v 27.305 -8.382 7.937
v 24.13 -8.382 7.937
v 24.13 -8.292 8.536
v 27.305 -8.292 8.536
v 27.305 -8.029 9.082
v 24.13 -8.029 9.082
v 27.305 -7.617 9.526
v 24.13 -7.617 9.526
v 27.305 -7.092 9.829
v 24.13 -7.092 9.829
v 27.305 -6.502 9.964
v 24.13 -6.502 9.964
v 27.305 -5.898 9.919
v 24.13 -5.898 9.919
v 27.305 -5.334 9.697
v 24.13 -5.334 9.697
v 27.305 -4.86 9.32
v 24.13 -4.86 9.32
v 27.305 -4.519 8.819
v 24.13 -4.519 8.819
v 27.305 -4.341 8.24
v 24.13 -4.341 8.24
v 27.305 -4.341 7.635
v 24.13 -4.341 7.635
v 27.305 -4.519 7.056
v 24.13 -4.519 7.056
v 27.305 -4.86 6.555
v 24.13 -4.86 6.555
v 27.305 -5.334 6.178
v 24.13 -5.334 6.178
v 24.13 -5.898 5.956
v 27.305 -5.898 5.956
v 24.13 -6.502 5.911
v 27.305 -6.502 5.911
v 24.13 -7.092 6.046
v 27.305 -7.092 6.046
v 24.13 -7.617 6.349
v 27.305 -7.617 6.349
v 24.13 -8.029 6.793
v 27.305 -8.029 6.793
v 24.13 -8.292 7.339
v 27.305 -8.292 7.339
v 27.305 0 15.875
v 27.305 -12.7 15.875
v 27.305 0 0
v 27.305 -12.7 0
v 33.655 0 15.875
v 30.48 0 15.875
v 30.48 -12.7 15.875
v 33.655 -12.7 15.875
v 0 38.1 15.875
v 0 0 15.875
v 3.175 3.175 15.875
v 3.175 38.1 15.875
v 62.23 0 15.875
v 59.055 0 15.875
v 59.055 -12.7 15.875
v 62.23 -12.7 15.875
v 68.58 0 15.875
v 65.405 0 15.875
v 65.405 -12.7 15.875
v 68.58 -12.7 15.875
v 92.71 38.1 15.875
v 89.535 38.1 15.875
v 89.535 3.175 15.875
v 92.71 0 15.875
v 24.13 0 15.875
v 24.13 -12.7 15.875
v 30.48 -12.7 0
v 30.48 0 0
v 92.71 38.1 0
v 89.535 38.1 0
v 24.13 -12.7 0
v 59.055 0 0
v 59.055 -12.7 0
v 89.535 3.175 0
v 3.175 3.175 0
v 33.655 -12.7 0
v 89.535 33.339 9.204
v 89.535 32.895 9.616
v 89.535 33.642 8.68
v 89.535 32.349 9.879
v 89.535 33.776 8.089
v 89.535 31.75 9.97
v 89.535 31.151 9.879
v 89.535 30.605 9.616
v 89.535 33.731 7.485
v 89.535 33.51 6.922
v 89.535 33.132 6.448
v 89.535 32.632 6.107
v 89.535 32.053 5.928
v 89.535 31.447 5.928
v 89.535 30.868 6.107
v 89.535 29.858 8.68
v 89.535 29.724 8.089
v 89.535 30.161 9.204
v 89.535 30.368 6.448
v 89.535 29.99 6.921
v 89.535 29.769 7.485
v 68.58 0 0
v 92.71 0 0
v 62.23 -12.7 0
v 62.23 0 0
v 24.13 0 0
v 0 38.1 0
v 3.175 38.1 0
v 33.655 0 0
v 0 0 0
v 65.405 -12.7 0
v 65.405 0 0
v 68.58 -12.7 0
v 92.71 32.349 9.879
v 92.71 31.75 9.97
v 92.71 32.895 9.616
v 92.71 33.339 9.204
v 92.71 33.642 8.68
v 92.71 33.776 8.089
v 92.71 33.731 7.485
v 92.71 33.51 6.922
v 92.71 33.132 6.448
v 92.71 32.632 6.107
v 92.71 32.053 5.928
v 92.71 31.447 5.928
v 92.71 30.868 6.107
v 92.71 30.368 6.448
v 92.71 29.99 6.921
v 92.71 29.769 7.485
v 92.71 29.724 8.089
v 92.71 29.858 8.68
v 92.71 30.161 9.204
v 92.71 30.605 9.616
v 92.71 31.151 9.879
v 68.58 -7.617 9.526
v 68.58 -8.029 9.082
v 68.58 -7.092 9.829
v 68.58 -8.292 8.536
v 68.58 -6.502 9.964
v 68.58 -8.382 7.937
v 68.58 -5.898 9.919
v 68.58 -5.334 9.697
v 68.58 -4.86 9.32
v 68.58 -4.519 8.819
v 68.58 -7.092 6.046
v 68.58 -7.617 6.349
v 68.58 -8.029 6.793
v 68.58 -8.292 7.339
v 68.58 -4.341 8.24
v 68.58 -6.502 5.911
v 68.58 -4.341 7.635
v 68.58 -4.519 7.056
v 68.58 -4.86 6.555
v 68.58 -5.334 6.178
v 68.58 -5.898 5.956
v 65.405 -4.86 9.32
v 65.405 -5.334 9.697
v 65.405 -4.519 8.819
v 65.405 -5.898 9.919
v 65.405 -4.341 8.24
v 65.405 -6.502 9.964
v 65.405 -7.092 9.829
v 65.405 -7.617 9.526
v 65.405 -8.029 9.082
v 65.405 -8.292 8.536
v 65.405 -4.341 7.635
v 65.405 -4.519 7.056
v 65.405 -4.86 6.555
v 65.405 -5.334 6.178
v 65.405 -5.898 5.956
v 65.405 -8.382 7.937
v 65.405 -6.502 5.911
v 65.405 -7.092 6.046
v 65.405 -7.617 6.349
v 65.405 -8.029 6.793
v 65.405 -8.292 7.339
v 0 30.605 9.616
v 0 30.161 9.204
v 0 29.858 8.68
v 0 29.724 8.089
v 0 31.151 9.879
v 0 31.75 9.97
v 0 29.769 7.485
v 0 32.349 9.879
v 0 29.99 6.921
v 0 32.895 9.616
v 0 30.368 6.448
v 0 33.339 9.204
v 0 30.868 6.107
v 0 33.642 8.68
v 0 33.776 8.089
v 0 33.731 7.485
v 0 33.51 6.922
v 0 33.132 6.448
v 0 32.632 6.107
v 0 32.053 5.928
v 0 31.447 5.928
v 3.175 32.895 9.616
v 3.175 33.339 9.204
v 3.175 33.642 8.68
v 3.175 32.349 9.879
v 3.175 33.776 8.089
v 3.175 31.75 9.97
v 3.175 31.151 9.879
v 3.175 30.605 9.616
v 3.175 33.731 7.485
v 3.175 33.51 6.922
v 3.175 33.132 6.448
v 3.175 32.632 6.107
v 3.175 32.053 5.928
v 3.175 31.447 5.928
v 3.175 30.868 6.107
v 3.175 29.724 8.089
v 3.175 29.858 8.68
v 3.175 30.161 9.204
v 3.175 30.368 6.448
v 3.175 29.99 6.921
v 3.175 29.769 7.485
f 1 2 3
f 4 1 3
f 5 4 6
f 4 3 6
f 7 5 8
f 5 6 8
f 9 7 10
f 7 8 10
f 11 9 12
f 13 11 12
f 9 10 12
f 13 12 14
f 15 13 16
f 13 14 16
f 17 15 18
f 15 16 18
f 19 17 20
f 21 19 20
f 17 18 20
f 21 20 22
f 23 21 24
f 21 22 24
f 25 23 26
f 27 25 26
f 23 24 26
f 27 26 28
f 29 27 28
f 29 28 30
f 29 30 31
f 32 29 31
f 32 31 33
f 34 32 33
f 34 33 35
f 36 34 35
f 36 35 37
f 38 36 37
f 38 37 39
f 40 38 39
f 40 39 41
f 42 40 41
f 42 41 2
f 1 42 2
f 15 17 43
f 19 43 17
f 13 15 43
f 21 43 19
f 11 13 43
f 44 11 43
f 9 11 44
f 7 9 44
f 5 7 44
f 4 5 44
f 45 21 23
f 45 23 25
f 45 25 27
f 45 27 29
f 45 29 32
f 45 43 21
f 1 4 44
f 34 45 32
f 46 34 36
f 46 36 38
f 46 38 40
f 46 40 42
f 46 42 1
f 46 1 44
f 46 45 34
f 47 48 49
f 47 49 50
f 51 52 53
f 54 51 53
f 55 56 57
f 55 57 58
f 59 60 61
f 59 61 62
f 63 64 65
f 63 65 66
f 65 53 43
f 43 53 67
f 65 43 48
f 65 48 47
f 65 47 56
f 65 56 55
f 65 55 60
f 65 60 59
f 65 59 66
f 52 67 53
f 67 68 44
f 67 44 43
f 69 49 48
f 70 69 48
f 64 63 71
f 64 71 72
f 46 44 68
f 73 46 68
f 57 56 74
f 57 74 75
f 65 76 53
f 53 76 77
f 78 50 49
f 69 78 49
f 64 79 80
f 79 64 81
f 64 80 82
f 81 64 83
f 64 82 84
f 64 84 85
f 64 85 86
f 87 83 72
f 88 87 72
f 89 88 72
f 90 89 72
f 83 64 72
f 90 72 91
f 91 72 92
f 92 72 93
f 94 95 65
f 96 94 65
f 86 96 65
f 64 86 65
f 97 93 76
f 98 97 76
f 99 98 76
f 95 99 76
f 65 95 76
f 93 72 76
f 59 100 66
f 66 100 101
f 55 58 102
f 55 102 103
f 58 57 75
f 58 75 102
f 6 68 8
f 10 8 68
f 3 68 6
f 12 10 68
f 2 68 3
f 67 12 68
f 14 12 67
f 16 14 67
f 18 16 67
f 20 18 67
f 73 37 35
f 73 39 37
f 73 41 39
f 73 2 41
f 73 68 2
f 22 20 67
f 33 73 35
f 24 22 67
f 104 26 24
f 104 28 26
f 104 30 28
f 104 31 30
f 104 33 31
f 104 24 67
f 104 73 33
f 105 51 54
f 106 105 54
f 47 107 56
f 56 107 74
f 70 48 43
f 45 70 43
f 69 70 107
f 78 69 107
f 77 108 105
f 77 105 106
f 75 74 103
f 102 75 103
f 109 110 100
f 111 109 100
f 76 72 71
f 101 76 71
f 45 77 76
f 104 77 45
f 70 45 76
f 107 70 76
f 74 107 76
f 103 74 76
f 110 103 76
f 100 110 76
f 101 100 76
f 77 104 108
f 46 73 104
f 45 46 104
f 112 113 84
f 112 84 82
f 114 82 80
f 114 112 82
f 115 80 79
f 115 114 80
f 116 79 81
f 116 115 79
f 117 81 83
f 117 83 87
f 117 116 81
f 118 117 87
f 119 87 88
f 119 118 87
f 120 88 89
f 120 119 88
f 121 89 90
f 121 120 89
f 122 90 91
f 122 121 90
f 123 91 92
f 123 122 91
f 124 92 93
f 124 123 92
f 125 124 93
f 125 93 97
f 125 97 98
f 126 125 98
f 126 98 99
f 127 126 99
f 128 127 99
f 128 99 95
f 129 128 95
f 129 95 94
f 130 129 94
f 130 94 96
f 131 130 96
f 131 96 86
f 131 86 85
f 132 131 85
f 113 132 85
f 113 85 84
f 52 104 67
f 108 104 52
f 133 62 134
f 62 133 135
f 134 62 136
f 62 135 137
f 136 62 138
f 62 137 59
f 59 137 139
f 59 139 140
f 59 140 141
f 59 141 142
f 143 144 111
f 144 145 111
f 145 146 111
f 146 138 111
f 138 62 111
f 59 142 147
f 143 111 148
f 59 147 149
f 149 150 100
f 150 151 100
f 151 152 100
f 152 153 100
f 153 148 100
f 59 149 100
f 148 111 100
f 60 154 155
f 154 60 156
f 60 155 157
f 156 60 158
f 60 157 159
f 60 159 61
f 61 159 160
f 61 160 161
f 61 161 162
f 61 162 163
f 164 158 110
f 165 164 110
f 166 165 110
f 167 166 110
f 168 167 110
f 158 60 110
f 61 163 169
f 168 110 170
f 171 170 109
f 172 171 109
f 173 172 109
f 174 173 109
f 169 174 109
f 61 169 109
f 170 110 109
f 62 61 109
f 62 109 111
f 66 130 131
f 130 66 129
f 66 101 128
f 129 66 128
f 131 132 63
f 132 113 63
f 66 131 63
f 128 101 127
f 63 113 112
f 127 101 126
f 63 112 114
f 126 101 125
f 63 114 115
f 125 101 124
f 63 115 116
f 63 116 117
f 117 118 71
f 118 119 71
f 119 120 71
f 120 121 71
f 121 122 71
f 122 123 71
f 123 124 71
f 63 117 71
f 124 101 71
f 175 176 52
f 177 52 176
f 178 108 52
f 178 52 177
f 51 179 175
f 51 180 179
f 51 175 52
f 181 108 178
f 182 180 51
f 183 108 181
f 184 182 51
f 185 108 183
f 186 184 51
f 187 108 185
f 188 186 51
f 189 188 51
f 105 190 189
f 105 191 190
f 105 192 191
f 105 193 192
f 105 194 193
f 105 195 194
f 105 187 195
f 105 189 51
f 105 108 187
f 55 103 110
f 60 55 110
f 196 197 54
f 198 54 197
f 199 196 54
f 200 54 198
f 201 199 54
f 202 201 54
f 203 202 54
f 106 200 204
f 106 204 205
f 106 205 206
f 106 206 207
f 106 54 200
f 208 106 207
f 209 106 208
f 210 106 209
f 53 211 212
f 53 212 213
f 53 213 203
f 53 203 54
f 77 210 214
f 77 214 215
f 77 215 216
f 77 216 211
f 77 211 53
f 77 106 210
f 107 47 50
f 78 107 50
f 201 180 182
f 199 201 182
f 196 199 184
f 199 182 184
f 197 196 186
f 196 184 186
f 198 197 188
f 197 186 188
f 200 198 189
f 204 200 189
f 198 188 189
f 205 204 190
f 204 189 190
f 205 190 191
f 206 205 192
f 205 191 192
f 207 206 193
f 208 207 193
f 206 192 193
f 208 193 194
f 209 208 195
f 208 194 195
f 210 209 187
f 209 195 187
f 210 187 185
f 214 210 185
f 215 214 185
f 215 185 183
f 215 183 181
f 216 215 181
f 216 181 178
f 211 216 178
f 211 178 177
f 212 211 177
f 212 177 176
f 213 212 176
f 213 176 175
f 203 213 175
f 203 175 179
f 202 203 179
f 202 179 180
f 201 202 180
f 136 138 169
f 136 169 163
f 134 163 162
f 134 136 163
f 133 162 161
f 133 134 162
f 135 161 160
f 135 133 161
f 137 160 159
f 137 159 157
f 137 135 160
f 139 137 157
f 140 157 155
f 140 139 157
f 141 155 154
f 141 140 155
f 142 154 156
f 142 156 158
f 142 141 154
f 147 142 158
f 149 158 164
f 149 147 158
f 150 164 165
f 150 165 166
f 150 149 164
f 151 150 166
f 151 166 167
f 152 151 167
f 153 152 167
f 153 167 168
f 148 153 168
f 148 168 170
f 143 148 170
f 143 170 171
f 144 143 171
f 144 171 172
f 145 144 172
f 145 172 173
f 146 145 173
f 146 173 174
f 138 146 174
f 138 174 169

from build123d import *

# Parameters (mm, degrees)
BOSS_EXTRUDE1_DEPTH = 15.875
CUT_EXTRUDE2_REACH  = 49.811
SKETCH3_R           = 2.032
CUT_EXTRUDE3_REACH  = 64.068
SKETCH4_R           = 2.032


with BuildPart() as part:
    # Sketch1 → Boss-Extrude1 (new body)
    with BuildSketch(Plane.XY):
        Polygon((3.175, 3.175), (46.355, 3.175), (46.355, 0), (33.655, 0), (33.655, -12.7), (30.48, -12.7), (30.48, 0), (27.305, 0), (27.305, -12.7), (24.13, -12.7), (24.13, 0), (0, 0), (0, 38.1), (3.175, 38.1), align=None)
    boss_extrude1 = extrude(amount=BOSS_EXTRUDE1_DEPTH)

    # Sketch3 → Cut-Extrude2 (cut, up to next)
    with BuildSketch(Plane.ZY.offset(-24.13), mode=Mode.PRIVATE) as cut_extrude2_sk1:
        with Locations(Location((7.9375, -6.35, 0), (0, 0, 270))):
            Circle(SKETCH3_R)
    cut_extrude2_tool1 = extrude(cut_extrude2_sk1.sketch, amount=-CUT_EXTRUDE2_REACH, mode=Mode.PRIVATE) & part.part
    cut_extrude2 = cut_extrude2_tool1.solids().sort_by_distance((24.13, -6.35, 7.9375))[0]
    add(cut_extrude2, mode=Mode.SUBTRACT)

    # Sketch4 → Cut-Extrude3 (cut, up to next)
    with BuildSketch(Plane.ZY, mode=Mode.PRIVATE) as cut_extrude3_sk1:
        with Locations((7.9375, 31.75)):
            Circle(SKETCH4_R)
    cut_extrude3_tool1 = extrude(cut_extrude3_sk1.sketch, amount=-CUT_EXTRUDE3_REACH, mode=Mode.PRIVATE) & part.part
    cut_extrude3 = cut_extrude3_tool1.solids().sort_by_distance((0, 31.75, 7.9375))[0]
    add(cut_extrude3, mode=Mode.SUBTRACT)

    # Mirror2: Boss-Extrude1, Cut-Extrude2, Cut-Extrude3 across plane
    add(boss_extrude1.mirror(Plane(origin=(46.355, 0, 0), x_dir=(0, 0, 1), z_dir=(1, 0, 0))))
    add(cut_extrude2.mirror(Plane(origin=(46.355, 0, 0), x_dir=(0, 0, 1), z_dir=(1, 0, 0))), mode=Mode.SUBTRACT)
    add(cut_extrude3.mirror(Plane(origin=(46.355, 0, 0), x_dir=(0, 0, 1), z_dir=(1, 0, 0))), mode=Mode.SUBTRACT)


solid = part.part
